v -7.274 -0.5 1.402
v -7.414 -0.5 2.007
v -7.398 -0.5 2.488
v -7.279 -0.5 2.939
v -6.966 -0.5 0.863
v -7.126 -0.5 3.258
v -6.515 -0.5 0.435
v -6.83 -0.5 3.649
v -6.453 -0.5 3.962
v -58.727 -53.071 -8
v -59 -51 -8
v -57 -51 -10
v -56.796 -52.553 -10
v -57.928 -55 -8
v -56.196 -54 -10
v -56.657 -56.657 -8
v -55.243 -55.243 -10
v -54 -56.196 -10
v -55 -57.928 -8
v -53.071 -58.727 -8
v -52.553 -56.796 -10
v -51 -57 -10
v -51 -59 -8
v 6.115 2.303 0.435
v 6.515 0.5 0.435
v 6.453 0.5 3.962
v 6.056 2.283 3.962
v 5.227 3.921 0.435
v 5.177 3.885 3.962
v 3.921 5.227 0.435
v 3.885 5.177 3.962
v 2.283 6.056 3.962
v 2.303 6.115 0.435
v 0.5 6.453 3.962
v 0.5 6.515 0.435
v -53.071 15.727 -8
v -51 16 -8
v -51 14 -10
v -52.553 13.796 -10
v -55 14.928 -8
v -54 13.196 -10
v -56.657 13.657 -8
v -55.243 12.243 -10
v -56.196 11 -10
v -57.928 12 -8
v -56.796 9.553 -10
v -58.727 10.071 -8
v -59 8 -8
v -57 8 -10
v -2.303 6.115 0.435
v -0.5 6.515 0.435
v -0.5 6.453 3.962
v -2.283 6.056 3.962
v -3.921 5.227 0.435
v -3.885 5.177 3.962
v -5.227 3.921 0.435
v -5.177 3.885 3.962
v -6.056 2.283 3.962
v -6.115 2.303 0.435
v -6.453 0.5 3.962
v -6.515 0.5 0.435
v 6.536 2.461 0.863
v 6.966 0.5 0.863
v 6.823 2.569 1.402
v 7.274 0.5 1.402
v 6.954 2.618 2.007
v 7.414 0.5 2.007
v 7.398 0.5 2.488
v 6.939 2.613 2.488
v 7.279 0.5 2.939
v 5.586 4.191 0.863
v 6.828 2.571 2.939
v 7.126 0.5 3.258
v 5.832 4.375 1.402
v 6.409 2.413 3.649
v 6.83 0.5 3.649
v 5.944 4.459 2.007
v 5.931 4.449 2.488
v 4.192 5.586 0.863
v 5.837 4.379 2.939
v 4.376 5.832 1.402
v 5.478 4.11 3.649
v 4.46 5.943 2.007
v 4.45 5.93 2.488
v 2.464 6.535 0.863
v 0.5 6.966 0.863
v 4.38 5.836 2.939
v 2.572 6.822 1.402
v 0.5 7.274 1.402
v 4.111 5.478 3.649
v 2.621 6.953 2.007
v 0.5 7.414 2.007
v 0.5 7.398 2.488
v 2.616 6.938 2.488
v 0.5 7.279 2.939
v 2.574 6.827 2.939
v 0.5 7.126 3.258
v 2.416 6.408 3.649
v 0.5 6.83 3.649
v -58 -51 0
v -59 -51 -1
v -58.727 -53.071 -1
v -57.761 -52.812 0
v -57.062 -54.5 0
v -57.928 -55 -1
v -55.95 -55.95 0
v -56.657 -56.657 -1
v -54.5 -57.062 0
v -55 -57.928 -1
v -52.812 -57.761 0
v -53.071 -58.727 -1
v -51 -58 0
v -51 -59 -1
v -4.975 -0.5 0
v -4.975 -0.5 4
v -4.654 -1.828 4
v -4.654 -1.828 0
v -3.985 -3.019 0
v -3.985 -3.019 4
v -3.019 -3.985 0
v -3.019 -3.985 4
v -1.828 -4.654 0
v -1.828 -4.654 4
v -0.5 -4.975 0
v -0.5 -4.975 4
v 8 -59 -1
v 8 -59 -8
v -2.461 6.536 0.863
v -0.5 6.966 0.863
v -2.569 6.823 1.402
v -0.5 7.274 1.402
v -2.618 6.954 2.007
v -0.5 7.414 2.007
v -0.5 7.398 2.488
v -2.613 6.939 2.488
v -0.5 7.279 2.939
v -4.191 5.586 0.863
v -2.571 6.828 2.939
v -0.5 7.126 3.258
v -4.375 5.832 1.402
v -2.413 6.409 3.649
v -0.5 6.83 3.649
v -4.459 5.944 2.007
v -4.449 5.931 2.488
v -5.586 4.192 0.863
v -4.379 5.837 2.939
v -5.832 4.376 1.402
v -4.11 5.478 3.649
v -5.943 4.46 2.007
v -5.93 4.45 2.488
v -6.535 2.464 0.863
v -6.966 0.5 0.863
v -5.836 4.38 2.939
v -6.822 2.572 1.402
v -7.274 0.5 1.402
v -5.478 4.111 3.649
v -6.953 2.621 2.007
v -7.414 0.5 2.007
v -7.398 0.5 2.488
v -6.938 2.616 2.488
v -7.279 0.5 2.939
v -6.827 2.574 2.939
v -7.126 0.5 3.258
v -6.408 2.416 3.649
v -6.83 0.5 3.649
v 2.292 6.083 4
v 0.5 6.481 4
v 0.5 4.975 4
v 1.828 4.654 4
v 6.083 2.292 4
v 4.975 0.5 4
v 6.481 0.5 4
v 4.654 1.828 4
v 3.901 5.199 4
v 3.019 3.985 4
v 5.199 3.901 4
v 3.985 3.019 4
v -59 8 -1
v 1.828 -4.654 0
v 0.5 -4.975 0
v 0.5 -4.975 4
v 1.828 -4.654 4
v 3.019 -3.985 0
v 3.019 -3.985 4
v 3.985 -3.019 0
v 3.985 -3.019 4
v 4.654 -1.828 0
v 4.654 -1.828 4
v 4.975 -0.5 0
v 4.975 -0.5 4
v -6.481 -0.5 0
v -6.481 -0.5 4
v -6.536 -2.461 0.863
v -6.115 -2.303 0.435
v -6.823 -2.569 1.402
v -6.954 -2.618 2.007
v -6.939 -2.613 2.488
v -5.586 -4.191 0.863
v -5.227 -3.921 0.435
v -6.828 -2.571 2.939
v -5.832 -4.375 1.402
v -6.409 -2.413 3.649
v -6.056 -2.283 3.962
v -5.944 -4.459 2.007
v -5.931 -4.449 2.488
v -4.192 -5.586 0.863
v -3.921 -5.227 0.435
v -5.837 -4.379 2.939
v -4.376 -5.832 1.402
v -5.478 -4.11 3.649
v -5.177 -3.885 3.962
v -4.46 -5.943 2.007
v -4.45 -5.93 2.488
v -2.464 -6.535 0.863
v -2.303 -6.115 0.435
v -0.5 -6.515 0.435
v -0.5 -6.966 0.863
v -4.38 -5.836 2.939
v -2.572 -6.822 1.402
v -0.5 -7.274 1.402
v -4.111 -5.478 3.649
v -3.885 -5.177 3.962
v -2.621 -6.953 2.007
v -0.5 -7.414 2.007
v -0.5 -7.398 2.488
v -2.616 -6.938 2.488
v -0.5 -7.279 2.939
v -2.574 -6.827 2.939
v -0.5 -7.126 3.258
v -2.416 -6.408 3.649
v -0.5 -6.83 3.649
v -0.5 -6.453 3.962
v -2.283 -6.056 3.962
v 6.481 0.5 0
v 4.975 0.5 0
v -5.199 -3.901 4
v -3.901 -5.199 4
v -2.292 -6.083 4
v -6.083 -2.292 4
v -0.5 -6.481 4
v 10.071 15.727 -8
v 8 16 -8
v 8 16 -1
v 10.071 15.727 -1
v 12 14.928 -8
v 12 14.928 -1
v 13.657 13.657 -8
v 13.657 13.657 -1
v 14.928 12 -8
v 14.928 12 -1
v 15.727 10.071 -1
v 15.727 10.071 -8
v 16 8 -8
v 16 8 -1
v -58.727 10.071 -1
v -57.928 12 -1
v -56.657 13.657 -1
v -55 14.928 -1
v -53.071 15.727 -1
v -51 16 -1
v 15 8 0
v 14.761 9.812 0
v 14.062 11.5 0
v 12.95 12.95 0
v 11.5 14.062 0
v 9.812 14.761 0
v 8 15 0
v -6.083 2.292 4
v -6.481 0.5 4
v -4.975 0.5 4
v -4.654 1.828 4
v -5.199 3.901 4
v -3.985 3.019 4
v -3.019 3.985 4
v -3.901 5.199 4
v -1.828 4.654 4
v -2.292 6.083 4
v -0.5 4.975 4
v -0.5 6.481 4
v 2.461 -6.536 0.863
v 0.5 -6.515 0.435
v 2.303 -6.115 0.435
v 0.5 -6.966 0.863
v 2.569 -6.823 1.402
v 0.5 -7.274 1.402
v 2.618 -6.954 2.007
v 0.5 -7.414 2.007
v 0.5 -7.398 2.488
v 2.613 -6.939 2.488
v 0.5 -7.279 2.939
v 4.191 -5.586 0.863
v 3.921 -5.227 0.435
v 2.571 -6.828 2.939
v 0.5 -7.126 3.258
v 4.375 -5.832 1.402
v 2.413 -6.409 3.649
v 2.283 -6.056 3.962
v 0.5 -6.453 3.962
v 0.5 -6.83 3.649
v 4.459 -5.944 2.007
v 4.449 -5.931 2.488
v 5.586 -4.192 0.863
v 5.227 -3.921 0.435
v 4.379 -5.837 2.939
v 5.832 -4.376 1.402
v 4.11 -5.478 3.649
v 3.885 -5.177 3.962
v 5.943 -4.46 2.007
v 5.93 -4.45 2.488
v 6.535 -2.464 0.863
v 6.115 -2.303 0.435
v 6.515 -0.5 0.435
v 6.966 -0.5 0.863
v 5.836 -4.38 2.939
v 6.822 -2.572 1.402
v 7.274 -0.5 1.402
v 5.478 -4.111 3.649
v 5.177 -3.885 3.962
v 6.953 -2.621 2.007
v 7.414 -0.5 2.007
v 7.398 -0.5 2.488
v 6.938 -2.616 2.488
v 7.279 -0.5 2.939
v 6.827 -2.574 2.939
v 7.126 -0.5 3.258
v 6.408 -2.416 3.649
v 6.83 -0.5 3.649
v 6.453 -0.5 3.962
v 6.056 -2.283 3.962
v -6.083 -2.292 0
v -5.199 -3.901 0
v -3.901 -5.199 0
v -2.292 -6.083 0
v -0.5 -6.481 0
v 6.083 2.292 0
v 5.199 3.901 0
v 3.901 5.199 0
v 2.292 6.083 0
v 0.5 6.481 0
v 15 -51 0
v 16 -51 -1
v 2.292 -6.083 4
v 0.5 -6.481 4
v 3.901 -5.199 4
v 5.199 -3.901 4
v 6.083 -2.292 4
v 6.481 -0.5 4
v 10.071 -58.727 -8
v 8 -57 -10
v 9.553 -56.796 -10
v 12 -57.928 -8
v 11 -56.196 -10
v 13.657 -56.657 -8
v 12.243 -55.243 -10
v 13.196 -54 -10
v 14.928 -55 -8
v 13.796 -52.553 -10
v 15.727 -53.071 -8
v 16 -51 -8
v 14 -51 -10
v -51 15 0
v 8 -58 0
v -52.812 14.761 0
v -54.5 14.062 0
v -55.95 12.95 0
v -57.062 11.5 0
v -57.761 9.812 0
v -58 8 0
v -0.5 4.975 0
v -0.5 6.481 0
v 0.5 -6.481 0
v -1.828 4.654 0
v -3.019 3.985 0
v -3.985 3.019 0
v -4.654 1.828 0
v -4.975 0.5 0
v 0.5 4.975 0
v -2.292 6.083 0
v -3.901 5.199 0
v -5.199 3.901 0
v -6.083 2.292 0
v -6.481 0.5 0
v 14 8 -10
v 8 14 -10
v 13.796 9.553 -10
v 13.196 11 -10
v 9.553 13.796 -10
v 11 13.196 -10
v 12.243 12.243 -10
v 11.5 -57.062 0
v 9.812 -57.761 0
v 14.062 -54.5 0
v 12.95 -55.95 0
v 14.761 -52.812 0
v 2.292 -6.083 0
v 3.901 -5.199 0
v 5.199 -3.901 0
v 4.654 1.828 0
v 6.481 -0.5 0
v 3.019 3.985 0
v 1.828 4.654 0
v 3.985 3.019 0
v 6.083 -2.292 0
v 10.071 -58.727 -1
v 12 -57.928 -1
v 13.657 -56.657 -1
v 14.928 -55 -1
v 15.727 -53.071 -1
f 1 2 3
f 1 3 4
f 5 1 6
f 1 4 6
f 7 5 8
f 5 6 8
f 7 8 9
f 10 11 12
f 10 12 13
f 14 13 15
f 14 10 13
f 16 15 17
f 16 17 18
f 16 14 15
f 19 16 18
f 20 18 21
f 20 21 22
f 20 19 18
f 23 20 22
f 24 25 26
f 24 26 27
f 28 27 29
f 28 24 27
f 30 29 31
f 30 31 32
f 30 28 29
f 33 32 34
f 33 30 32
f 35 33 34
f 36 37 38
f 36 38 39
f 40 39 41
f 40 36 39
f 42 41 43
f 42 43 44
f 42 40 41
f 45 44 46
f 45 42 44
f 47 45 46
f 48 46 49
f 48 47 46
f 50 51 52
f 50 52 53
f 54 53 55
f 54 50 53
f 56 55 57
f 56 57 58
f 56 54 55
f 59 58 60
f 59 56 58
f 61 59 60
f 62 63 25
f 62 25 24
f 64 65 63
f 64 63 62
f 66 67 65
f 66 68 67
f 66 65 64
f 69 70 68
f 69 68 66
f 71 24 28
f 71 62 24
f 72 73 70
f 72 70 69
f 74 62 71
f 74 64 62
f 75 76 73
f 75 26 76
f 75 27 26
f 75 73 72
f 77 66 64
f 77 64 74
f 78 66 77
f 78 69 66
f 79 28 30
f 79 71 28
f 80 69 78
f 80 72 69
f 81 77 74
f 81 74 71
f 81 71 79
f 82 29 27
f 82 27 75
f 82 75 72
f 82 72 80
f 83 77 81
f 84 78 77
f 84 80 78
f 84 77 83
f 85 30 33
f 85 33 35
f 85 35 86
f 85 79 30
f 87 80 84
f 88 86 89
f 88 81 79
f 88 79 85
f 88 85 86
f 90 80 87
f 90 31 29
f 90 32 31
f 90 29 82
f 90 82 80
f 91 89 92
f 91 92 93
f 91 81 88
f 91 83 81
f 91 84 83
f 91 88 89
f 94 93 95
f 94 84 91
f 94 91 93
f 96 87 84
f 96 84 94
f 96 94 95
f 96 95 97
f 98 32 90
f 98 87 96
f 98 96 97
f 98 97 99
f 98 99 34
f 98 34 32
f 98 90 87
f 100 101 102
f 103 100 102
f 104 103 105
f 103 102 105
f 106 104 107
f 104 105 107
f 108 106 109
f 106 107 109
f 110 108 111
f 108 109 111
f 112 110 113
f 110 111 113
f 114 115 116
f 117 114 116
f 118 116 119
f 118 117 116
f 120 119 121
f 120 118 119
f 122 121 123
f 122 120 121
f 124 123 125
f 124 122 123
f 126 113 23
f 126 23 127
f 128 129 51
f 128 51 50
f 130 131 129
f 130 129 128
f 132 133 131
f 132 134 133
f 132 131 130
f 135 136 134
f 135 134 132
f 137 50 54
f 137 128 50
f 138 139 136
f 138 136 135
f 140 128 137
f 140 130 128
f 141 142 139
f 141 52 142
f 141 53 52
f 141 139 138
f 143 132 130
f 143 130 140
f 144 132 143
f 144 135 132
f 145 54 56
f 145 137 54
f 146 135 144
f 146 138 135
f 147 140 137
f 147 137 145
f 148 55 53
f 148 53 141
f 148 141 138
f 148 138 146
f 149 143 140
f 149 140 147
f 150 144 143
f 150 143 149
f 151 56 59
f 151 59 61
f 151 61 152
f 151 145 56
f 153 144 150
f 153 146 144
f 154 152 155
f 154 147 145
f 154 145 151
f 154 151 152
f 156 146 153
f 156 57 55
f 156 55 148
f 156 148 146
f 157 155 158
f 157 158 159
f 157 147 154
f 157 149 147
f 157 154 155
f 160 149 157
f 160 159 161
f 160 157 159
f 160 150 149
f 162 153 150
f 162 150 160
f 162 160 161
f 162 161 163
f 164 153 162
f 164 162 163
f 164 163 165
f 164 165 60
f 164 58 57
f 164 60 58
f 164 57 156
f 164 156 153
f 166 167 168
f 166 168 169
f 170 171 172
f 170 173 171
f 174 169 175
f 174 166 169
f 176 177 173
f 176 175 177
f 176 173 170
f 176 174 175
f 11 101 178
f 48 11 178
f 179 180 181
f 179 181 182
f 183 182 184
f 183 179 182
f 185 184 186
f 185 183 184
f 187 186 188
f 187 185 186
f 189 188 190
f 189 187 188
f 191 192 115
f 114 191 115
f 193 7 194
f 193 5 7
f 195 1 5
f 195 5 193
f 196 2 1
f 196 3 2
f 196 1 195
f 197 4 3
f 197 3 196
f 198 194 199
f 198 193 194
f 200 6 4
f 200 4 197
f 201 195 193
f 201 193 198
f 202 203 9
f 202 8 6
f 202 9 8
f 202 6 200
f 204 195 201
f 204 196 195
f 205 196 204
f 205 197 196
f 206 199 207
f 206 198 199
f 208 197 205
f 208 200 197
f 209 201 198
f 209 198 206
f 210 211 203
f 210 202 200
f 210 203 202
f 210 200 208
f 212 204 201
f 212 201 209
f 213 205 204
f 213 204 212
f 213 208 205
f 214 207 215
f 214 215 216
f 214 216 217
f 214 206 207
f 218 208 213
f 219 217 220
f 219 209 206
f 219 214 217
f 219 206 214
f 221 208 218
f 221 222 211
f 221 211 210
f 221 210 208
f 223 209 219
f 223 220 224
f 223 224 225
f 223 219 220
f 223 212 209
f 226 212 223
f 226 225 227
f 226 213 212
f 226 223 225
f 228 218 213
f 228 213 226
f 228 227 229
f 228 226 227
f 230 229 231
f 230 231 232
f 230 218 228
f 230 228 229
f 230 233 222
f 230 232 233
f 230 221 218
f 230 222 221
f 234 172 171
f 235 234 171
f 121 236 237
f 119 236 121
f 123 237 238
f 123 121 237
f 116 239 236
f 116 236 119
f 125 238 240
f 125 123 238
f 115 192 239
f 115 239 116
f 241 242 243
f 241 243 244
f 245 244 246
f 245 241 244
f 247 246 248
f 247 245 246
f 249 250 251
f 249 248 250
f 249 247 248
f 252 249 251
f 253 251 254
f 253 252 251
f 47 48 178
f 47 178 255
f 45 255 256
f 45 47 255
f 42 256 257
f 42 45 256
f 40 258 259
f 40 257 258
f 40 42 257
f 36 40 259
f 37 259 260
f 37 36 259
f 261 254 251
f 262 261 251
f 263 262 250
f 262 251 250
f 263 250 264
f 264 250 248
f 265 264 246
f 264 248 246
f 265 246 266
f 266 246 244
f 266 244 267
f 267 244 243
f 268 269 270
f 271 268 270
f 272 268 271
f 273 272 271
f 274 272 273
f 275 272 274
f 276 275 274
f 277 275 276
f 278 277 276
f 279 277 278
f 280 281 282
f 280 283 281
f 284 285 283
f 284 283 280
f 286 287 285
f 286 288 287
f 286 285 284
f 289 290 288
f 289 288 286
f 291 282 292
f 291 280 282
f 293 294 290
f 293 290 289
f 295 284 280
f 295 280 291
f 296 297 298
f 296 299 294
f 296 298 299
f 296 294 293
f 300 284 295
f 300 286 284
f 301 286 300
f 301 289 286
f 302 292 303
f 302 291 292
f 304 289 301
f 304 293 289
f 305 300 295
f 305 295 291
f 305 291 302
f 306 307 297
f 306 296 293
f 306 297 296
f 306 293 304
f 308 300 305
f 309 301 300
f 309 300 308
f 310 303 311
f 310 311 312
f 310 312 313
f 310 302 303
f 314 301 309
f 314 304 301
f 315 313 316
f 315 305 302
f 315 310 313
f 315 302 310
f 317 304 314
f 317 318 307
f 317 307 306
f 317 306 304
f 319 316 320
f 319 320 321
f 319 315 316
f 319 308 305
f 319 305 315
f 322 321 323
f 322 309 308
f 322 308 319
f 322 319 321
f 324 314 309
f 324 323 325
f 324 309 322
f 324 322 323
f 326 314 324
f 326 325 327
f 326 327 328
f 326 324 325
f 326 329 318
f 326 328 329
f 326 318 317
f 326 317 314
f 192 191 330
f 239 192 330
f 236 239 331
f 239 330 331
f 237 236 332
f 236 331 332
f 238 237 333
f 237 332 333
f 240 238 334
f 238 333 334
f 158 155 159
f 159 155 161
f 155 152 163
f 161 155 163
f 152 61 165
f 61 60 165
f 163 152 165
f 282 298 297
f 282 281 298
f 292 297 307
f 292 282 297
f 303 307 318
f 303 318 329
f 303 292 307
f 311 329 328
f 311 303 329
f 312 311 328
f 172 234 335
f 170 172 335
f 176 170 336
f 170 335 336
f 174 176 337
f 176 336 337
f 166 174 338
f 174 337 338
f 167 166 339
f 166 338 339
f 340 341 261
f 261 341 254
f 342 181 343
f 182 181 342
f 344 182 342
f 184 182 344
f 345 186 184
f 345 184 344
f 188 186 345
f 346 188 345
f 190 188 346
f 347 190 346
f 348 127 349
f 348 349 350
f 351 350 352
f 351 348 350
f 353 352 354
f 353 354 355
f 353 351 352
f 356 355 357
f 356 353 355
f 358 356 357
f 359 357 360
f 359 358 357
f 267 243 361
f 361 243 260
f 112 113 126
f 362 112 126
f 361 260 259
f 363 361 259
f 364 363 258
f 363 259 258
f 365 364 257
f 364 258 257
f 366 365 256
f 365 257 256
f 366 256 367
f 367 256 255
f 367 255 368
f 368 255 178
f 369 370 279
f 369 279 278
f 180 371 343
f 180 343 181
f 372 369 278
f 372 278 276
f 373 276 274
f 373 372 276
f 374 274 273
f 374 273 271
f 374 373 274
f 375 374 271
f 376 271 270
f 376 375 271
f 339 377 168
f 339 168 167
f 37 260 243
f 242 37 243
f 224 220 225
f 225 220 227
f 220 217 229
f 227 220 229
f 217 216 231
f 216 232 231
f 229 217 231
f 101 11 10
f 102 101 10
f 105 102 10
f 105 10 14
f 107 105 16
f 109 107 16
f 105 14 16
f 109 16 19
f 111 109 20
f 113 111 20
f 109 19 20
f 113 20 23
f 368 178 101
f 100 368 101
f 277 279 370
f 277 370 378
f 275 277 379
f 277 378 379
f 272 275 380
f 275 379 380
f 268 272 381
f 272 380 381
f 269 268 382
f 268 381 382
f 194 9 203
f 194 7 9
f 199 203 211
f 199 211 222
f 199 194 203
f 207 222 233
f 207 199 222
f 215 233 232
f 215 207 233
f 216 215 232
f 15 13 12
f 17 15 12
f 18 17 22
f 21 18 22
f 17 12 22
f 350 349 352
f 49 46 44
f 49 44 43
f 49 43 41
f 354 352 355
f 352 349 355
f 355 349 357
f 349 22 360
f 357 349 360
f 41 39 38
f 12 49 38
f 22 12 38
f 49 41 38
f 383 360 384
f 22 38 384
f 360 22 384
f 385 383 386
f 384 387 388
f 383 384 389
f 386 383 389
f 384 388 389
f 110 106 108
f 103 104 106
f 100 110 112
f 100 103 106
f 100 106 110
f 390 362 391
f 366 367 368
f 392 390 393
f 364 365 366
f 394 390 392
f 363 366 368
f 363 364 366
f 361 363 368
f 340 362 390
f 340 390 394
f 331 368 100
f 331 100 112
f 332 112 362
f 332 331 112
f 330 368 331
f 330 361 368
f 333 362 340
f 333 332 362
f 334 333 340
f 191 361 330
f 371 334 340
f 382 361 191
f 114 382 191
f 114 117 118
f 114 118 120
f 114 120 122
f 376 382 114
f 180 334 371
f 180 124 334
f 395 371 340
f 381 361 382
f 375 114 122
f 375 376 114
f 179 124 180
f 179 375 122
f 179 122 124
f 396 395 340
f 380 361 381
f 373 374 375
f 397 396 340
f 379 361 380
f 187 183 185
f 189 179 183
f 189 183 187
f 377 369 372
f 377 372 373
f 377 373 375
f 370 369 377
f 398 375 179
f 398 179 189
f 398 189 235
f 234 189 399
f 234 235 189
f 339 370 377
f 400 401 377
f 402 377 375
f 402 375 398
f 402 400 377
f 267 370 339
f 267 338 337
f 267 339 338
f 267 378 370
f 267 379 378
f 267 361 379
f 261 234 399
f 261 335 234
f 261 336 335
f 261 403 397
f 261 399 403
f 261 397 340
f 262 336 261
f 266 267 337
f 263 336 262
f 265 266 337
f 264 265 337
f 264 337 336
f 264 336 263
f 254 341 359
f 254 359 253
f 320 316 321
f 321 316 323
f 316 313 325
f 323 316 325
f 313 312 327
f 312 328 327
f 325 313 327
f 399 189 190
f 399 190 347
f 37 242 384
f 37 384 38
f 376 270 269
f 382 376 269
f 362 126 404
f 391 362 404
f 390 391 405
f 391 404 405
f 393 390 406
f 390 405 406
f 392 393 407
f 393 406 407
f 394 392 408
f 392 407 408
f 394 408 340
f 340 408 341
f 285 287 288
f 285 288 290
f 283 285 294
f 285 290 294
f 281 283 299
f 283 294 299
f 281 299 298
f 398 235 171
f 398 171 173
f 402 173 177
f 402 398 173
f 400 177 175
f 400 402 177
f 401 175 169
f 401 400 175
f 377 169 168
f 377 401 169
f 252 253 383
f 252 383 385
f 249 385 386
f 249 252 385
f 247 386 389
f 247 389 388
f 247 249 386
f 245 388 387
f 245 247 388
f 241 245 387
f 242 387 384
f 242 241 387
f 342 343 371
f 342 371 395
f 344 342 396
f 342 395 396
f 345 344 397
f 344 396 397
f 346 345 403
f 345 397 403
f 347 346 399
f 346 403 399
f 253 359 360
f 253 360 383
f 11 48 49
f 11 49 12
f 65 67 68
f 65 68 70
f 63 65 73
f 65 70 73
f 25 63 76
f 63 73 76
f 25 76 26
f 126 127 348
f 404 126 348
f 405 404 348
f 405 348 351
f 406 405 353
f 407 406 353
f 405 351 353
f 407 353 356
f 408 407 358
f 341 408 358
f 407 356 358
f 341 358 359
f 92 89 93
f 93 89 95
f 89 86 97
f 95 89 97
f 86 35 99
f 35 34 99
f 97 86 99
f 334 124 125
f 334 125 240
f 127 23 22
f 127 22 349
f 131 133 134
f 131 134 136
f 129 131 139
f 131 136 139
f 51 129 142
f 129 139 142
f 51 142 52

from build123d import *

# Parameters (mm, degrees)
F0_R     = 6.5
F0_R_2   = 5
F1_DEPTH = 4
F0_W     = 75
F0_H     = 75
F2_DEPTH = 10
F3_R     = 8
F4_SIZE  = 2
F5_SIZE  = 1
F9_DEPTH = 4


with BuildPart() as f1:
    # F0 (on Top) → F1 (new body)
    with BuildSketch(Plane.XY):
        Circle(F0_R)
        Circle(F0_R_2, mode=Mode.SUBTRACT)
    extrude(amount=F1_DEPTH)

    # F0 (on Top) → F2 (join)
    with BuildSketch(Plane.XY):
        with Locations((-21.5, -21.5)):
            Rectangle(F0_W, F0_H)
        Circle(F0_R, mode=Mode.SUBTRACT)
        Circle(F0_R)
        Circle(F0_R_2, mode=Mode.SUBTRACT)
        Circle(F0_R_2)
    extrude(amount=-F2_DEPTH)

    # F3
    f3_edges = [f1.edges().sort_by_distance(p)[0] for p in [
        (-59, -59, -5),
        (16, -59, -5),
        (16, 16, -5),
        (-59, 16, -5),
    ]]
    fillet(f3_edges, radius=F3_R)

    # F4
    f4_edges = [f1.edges().sort_by_distance(p)[0] for p in [
        (-21.5, -59, -10),
    ]]
    chamfer(f4_edges, length=F4_SIZE)

    # F5
    f5_edges = [f1.edges().sort_by_distance(p)[0] for p in [
        (16, -21.5, 0),
    ]]
    chamfer(f5_edges, length=F5_SIZE)


with BuildPart() as f7:
    # F6 (on Front) → F7 (revolve)
    with BuildSketch(Plane.XZ):
        with BuildLine():
            Line((6.4723044634, 3.9617195725), (6.5340809524, 0.4349499941))
            ThreePointArc((6.5340809524, 0.4349499941), (7.4368212986, 2.2146886434), (6.4723044634, 3.9617195725))
        make_face()
    revolve(axis=Axis((0, 0, 8.3796254617), (0, 0, 1)))


with BuildPart() as f9_tool:
    # F8 (on face) → F9 (new body)
    with BuildSketch(Plane.XY.offset(4)):
        with BuildLine():
            Line((-6.4807406984, 0.5), (-9, 0.5))
            Line((-9, 0.5), (-9, -0.5))
            Line((-9, -0.5), (-6.4807406984, -0.5))
            ThreePointArc((-6.4807406984, -0.5), (-6.5, 0), (-6.4807406984, 0.5))
        make_face()
        with BuildLine():
            Line((-4.9749371855, 0.5), (-6.4807406984, 0.5))
            ThreePointArc((-6.4807406984, 0.5), (-6.5, 0), (-6.4807406984, -0.5))
            Line((-6.4807406984, -0.5), (-4.9749371855, -0.5))
            ThreePointArc((-4.9749371855, -0.5), (-5, 0), (-4.9749371855, 0.5))
        make_face()
        with BuildLine():
            Line((-0.5, 0.5), (-4.9749371855, 0.5))
            ThreePointArc((-4.9749371855, 0.5), (-5, 0), (-4.9749371855, -0.5))
            Line((-4.9749371855, -0.5), (-0.5, -0.5))
            Line((-0.5, -0.5), (-0.5, 0.5))
        make_face()
        with BuildLine():
            Line((4.9749371855, 0.5), (0.5, 0.5))
            Line((0.5, 0.5), (0.5, -0.5))
            Line((0.5, -0.5), (4.9749371855, -0.5))
            ThreePointArc((4.9749371855, -0.5), (4.9937303656, -0.2503138753), (5, 0))
            ThreePointArc((5, 0), (4.9937303656, 0.2503138753), (4.9749371855, 0.5))
        make_face()
        with BuildLine():
            ThreePointArc((6.5, 0), (6.49518339, 0.2501853916), (6.4807406984, 0.5))
            Line((6.4807406984, 0.5), (4.9749371855, 0.5))
            ThreePointArc((4.9749371855, 0.5), (4.9937303656, 0.2503138753), (5, 0))
            ThreePointArc((5, 0), (4.9937303656, -0.2503138753), (4.9749371855, -0.5))
            Line((4.9749371855, -0.5), (6.4807406984, -0.5))
            ThreePointArc((6.4807406984, -0.5), (6.49518339, -0.2501853916), (6.5, 0))
        make_face()
        with BuildLine():
            Line((9, 0.5), (6.4807406984, 0.5))
            ThreePointArc((6.4807406984, 0.5), (6.49518339, 0.2501853916), (6.5, 0))
            ThreePointArc((6.5, 0), (6.49518339, -0.2501853916), (6.4807406984, -0.5))
            Line((6.4807406984, -0.5), (9, -0.5))
            Line((9, -0.5), (9, 0.5))
        make_face()
        with BuildLine():
            Line((-0.5, 4.9749371855), (-0.5, 0.5))
            Line((-0.5, 0.5), (0.5, 0.5))
            Line((0.5, 0.5), (0.5, 4.9749371855))
            ThreePointArc((0.5, 4.9749371855), (0, 5), (-0.5, 4.9749371855))
        make_face()
        with BuildLine():
            ThreePointArc((0.5, 6.4807406984), (0, 6.5), (-0.5, 6.4807406984))
            Line((-0.5, 6.4807406984), (-0.5, 4.9749371855))
            ThreePointArc((-0.5, 4.9749371855), (0, 5), (0.5, 4.9749371855))
            Line((0.5, 4.9749371855), (0.5, 6.4807406984))
        make_face()
        with BuildLine():
            Line((-0.5, 9), (-0.5, 6.4807406984))
            ThreePointArc((-0.5, 6.4807406984), (0, 6.5), (0.5, 6.4807406984))
            Line((0.5, 6.4807406984), (0.5, 9))
            Line((0.5, 9), (-0.5, 9))
        make_face()
        with BuildLine():
            Line((0.5, -0.5), (-0.5, -0.5))
            Line((-0.5, -0.5), (-0.5, -4.9749371855))
            ThreePointArc((-0.5, -4.9749371855), (0, -5), (0.5, -4.9749371855))
            Line((0.5, -4.9749371855), (0.5, -0.5))
        make_face()
        with BuildLine():
            Line((-0.5, -4.9749371855), (-0.5, -6.4807406984))
            ThreePointArc((-0.5, -6.4807406984), (0, -6.5), (0.5, -6.4807406984))
            Line((0.5, -6.4807406984), (0.5, -4.9749371855))
            ThreePointArc((0.5, -4.9749371855), (0, -5), (-0.5, -4.9749371855))
        make_face()
        with BuildLine():
            ThreePointArc((0.5, -6.4807406984), (0, -6.5), (-0.5, -6.4807406984))
            Line((-0.5, -6.4807406984), (-0.5, -9))
            Line((-0.5, -9), (0.5, -9))
            Line((0.5, -9), (0.5, -6.4807406984))
        make_face()
    extrude(amount=-F9_DEPTH)


with BuildPart() as f1_1:
    add(f1.part)

    # F9: cut by f9_tool
    add(f9_tool.part, mode=Mode.SUBTRACT)


with BuildPart() as f7_1:
    add(f7.part)

    # F9: cut by f9_tool
    add(f9_tool.part, mode=Mode.SUBTRACT)


solid = Compound([f1_1.part, f7_1.part])
